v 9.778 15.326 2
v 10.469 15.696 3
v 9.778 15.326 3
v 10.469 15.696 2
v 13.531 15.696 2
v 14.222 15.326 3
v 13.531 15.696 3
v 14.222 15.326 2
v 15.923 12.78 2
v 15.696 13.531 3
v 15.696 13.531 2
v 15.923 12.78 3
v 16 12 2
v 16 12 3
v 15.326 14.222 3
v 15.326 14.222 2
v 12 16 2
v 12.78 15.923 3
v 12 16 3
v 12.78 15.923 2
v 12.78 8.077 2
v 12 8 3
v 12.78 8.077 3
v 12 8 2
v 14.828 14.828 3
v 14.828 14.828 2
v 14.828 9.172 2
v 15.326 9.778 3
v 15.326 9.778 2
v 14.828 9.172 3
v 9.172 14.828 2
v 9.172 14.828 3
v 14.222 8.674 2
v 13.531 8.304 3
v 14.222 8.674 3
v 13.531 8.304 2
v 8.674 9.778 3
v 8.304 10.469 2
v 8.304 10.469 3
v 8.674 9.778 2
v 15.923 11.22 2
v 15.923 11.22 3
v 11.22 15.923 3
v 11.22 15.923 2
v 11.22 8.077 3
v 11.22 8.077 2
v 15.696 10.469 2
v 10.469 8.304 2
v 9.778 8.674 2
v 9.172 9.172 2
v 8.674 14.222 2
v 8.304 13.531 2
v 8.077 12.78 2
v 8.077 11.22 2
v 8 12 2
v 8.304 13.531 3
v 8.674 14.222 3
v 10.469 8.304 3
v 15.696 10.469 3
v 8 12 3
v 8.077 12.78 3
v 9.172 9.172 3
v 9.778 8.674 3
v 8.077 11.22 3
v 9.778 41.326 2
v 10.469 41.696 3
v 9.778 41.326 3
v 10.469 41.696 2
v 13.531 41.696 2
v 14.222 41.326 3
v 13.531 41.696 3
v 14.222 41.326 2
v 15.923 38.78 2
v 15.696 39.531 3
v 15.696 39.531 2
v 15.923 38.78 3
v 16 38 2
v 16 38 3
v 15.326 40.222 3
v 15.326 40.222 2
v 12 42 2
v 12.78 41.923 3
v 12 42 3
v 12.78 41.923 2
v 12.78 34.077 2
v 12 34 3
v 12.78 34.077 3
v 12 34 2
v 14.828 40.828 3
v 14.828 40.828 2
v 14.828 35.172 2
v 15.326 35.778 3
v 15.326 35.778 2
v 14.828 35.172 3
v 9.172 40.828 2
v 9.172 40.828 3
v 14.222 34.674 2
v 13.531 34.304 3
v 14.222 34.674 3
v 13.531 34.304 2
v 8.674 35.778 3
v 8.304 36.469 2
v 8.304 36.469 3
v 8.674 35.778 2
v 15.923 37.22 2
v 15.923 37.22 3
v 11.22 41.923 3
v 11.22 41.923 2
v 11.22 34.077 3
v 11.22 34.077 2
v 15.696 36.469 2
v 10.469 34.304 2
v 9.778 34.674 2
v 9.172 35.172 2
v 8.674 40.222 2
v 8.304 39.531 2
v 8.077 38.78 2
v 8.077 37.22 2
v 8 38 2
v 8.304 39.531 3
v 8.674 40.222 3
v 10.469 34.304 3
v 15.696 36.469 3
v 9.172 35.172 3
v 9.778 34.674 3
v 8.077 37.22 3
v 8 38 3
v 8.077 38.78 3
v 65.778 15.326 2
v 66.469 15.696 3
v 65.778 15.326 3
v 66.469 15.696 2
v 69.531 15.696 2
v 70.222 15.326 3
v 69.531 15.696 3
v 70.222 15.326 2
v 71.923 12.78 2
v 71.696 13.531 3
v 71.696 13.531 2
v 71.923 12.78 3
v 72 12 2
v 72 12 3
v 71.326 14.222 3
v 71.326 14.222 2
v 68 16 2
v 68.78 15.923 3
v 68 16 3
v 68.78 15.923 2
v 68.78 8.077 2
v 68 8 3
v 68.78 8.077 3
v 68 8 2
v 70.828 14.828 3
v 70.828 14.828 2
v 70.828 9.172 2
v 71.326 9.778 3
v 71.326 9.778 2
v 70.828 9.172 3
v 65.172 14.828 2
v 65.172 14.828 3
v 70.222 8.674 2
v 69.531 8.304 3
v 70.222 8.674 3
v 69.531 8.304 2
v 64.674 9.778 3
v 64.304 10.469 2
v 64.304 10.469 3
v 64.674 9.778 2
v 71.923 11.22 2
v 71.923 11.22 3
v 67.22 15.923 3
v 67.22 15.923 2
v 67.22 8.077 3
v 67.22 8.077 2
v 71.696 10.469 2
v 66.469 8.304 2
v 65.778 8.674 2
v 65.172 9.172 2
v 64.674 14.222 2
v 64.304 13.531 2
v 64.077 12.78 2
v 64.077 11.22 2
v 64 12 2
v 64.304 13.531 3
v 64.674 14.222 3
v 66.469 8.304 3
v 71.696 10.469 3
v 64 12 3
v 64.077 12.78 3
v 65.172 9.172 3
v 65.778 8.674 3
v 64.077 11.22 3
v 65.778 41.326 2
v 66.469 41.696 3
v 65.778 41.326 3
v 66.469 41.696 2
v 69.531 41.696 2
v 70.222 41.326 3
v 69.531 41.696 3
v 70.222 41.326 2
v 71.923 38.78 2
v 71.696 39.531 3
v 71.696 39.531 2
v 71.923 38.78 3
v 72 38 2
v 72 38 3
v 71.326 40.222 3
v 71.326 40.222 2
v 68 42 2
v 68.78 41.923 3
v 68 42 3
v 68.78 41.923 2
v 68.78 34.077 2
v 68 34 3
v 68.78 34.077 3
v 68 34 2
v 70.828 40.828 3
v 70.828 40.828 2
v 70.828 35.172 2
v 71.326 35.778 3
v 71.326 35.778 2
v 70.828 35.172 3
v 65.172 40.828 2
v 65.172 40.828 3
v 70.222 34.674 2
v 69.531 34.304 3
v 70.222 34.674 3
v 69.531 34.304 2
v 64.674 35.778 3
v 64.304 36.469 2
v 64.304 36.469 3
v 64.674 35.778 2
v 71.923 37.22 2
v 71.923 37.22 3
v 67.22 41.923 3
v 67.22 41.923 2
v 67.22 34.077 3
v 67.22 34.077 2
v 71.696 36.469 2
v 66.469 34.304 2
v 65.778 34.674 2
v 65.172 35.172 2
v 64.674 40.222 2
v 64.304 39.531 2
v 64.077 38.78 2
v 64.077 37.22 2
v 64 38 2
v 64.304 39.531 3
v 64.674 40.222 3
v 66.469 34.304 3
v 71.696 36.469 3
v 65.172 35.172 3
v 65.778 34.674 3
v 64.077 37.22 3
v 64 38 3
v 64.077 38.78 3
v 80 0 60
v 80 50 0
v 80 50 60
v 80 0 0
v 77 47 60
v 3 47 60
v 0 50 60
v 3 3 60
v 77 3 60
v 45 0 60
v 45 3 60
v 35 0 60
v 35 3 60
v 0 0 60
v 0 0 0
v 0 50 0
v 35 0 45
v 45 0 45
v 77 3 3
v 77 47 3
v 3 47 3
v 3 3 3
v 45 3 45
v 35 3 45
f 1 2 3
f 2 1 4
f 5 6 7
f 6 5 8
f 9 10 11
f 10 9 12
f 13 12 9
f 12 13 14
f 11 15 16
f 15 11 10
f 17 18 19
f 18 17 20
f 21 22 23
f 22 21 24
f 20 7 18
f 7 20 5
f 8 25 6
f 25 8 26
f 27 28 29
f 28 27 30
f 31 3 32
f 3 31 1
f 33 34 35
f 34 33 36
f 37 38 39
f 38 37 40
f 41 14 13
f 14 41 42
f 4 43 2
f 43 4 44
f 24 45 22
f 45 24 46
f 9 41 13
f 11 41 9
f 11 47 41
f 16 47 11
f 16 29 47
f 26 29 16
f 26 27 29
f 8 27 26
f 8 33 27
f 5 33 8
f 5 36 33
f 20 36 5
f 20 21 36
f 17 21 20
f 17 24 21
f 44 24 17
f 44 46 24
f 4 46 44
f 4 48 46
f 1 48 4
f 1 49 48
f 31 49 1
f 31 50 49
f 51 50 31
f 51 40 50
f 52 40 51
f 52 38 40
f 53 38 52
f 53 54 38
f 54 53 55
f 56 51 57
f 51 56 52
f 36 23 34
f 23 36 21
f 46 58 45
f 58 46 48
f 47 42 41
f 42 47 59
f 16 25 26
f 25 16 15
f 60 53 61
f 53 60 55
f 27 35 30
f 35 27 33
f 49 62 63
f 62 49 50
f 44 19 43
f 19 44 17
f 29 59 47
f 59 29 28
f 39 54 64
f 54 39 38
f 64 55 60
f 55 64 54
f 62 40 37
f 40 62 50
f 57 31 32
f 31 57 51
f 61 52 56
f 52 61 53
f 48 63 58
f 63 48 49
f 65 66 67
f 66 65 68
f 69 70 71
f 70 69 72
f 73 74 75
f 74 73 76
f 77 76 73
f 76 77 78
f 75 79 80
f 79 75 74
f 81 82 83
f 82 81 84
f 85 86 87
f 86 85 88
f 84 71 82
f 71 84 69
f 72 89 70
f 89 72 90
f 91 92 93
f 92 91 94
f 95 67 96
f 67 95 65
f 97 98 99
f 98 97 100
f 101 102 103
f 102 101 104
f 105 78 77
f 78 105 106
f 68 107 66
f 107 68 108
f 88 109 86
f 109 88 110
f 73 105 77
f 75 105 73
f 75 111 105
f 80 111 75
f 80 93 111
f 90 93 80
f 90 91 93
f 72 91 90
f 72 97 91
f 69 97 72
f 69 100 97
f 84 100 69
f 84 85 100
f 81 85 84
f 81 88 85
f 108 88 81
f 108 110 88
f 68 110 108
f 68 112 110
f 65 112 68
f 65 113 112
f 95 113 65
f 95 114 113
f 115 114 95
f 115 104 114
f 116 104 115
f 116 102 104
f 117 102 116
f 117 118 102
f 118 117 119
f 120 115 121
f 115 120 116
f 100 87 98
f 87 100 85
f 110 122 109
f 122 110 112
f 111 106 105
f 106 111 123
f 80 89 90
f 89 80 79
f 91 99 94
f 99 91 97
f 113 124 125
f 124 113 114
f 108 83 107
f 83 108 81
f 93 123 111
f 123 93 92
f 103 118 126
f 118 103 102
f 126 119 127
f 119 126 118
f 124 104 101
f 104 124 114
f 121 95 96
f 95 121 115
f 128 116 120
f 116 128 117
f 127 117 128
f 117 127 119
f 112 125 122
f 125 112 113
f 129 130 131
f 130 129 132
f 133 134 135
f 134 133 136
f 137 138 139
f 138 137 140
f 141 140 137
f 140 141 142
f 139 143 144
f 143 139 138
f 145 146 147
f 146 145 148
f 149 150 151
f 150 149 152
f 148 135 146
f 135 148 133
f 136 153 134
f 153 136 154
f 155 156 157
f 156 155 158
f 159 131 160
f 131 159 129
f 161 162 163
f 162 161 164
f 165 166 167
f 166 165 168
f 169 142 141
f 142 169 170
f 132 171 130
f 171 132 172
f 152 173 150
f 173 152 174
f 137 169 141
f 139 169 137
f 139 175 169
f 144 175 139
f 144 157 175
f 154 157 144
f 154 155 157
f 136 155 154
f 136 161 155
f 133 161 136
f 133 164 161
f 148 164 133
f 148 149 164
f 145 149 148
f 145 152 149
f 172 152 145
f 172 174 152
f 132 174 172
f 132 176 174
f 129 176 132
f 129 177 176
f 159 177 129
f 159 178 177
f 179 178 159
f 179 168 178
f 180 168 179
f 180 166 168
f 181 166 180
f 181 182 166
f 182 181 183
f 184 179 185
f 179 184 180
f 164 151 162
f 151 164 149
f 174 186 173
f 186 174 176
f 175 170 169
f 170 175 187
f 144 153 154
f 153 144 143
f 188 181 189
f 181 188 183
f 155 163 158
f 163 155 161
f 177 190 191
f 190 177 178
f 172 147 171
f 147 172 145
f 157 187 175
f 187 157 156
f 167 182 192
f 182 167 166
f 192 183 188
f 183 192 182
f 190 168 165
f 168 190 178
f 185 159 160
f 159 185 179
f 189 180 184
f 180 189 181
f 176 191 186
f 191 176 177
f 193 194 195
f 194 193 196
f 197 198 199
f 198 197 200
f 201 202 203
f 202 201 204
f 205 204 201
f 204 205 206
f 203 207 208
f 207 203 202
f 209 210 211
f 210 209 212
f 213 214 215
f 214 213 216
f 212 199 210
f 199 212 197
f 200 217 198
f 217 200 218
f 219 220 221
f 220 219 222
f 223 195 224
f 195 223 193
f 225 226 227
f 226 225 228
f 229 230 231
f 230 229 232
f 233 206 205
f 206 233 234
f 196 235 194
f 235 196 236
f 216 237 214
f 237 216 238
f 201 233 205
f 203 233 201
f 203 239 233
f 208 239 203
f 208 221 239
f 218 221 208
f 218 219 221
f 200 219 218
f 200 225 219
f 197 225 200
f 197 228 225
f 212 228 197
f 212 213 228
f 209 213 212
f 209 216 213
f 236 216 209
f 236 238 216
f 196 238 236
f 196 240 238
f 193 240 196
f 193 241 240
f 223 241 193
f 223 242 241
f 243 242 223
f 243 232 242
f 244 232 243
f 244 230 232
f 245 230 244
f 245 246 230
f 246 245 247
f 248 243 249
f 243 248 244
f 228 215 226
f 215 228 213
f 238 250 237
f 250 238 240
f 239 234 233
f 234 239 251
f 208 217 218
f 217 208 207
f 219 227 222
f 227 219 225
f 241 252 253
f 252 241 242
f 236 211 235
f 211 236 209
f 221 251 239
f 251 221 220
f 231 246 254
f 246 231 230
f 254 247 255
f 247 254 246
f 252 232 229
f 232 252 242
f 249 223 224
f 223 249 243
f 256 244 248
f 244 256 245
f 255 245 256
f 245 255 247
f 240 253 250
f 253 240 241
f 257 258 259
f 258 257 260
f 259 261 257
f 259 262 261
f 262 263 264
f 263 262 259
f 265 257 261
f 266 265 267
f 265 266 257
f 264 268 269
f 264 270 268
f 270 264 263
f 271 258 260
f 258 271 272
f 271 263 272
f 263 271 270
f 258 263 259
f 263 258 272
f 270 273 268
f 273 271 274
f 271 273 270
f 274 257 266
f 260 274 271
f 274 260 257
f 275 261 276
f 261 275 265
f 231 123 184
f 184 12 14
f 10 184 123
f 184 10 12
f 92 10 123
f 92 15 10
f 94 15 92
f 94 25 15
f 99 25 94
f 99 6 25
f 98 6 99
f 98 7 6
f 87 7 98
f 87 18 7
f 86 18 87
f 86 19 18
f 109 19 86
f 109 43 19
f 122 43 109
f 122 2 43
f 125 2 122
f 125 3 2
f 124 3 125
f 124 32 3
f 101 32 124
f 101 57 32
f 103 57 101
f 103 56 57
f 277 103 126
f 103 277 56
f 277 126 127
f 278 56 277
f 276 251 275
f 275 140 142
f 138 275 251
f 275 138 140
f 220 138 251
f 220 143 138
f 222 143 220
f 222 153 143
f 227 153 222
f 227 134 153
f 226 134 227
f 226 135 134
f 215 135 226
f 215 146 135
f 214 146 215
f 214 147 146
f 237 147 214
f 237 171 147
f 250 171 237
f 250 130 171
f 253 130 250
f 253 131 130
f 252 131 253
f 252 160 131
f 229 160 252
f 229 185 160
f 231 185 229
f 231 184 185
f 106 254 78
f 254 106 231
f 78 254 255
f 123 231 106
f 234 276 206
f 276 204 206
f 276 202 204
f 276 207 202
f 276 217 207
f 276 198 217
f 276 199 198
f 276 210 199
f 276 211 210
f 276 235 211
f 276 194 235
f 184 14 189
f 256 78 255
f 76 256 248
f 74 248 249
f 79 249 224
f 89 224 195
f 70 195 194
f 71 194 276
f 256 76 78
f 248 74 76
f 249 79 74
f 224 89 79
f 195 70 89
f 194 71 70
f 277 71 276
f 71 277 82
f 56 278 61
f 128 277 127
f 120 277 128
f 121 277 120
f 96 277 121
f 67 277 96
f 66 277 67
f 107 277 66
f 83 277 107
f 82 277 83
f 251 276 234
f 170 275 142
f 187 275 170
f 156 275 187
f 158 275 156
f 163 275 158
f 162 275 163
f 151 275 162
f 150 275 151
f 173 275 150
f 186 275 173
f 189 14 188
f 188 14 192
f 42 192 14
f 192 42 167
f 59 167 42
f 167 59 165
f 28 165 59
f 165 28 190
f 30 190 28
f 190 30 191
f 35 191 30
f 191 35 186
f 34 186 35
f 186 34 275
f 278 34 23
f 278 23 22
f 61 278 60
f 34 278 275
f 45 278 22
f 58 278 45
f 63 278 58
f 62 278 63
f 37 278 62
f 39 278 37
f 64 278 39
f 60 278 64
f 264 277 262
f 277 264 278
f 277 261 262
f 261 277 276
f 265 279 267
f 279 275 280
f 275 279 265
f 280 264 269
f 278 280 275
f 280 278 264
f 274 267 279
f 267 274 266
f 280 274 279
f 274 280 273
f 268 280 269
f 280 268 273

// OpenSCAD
$fn = 32;

// ----------------------------------------------------------------------
// Enclosure box: both enclosure
// ----------------------------------------------------------------------

// --- parameters (mm) ---
box_l = 80;               // outer length, X
box_w = 50;               // outer width, Y
box_h = 60;               // outer height
wall_t = 3;               // wall thickness
boss_r = 4;               // corner boss radius
hole_r = 1.5;             // boss screw hole radius
boss_in = 12;             // boss inset from the corners
notch_w = 10;             // cable notch width
notch_h = 15;             // cable notch height

inner_h = box_h - wall_t;  // cavity depth
boss_h = inner_h - 2;  // corner boss height

difference() {
  cube([box_l, box_w, box_h]);
  translate([wall_t, wall_t, wall_t])
    cube([box_l - 2 * wall_t, box_w - 2 * wall_t, box_h]);
  for (sx = [0, 1], sy = [0, 1])
    translate([sx ? box_l - boss_in : boss_in,
               sy ? box_w - boss_in : boss_in, wall_t - 1]) {
      cylinder(r = boss_r, h = boss_h);
      translate([0, 0, boss_h - 4])
        cylinder(r = hole_r, h = 5);
    }
  translate([box_l / 2 - notch_w / 2, -1, box_h - notch_h])
    cube([notch_w, wall_t + 2, notch_h + 1]);
}
